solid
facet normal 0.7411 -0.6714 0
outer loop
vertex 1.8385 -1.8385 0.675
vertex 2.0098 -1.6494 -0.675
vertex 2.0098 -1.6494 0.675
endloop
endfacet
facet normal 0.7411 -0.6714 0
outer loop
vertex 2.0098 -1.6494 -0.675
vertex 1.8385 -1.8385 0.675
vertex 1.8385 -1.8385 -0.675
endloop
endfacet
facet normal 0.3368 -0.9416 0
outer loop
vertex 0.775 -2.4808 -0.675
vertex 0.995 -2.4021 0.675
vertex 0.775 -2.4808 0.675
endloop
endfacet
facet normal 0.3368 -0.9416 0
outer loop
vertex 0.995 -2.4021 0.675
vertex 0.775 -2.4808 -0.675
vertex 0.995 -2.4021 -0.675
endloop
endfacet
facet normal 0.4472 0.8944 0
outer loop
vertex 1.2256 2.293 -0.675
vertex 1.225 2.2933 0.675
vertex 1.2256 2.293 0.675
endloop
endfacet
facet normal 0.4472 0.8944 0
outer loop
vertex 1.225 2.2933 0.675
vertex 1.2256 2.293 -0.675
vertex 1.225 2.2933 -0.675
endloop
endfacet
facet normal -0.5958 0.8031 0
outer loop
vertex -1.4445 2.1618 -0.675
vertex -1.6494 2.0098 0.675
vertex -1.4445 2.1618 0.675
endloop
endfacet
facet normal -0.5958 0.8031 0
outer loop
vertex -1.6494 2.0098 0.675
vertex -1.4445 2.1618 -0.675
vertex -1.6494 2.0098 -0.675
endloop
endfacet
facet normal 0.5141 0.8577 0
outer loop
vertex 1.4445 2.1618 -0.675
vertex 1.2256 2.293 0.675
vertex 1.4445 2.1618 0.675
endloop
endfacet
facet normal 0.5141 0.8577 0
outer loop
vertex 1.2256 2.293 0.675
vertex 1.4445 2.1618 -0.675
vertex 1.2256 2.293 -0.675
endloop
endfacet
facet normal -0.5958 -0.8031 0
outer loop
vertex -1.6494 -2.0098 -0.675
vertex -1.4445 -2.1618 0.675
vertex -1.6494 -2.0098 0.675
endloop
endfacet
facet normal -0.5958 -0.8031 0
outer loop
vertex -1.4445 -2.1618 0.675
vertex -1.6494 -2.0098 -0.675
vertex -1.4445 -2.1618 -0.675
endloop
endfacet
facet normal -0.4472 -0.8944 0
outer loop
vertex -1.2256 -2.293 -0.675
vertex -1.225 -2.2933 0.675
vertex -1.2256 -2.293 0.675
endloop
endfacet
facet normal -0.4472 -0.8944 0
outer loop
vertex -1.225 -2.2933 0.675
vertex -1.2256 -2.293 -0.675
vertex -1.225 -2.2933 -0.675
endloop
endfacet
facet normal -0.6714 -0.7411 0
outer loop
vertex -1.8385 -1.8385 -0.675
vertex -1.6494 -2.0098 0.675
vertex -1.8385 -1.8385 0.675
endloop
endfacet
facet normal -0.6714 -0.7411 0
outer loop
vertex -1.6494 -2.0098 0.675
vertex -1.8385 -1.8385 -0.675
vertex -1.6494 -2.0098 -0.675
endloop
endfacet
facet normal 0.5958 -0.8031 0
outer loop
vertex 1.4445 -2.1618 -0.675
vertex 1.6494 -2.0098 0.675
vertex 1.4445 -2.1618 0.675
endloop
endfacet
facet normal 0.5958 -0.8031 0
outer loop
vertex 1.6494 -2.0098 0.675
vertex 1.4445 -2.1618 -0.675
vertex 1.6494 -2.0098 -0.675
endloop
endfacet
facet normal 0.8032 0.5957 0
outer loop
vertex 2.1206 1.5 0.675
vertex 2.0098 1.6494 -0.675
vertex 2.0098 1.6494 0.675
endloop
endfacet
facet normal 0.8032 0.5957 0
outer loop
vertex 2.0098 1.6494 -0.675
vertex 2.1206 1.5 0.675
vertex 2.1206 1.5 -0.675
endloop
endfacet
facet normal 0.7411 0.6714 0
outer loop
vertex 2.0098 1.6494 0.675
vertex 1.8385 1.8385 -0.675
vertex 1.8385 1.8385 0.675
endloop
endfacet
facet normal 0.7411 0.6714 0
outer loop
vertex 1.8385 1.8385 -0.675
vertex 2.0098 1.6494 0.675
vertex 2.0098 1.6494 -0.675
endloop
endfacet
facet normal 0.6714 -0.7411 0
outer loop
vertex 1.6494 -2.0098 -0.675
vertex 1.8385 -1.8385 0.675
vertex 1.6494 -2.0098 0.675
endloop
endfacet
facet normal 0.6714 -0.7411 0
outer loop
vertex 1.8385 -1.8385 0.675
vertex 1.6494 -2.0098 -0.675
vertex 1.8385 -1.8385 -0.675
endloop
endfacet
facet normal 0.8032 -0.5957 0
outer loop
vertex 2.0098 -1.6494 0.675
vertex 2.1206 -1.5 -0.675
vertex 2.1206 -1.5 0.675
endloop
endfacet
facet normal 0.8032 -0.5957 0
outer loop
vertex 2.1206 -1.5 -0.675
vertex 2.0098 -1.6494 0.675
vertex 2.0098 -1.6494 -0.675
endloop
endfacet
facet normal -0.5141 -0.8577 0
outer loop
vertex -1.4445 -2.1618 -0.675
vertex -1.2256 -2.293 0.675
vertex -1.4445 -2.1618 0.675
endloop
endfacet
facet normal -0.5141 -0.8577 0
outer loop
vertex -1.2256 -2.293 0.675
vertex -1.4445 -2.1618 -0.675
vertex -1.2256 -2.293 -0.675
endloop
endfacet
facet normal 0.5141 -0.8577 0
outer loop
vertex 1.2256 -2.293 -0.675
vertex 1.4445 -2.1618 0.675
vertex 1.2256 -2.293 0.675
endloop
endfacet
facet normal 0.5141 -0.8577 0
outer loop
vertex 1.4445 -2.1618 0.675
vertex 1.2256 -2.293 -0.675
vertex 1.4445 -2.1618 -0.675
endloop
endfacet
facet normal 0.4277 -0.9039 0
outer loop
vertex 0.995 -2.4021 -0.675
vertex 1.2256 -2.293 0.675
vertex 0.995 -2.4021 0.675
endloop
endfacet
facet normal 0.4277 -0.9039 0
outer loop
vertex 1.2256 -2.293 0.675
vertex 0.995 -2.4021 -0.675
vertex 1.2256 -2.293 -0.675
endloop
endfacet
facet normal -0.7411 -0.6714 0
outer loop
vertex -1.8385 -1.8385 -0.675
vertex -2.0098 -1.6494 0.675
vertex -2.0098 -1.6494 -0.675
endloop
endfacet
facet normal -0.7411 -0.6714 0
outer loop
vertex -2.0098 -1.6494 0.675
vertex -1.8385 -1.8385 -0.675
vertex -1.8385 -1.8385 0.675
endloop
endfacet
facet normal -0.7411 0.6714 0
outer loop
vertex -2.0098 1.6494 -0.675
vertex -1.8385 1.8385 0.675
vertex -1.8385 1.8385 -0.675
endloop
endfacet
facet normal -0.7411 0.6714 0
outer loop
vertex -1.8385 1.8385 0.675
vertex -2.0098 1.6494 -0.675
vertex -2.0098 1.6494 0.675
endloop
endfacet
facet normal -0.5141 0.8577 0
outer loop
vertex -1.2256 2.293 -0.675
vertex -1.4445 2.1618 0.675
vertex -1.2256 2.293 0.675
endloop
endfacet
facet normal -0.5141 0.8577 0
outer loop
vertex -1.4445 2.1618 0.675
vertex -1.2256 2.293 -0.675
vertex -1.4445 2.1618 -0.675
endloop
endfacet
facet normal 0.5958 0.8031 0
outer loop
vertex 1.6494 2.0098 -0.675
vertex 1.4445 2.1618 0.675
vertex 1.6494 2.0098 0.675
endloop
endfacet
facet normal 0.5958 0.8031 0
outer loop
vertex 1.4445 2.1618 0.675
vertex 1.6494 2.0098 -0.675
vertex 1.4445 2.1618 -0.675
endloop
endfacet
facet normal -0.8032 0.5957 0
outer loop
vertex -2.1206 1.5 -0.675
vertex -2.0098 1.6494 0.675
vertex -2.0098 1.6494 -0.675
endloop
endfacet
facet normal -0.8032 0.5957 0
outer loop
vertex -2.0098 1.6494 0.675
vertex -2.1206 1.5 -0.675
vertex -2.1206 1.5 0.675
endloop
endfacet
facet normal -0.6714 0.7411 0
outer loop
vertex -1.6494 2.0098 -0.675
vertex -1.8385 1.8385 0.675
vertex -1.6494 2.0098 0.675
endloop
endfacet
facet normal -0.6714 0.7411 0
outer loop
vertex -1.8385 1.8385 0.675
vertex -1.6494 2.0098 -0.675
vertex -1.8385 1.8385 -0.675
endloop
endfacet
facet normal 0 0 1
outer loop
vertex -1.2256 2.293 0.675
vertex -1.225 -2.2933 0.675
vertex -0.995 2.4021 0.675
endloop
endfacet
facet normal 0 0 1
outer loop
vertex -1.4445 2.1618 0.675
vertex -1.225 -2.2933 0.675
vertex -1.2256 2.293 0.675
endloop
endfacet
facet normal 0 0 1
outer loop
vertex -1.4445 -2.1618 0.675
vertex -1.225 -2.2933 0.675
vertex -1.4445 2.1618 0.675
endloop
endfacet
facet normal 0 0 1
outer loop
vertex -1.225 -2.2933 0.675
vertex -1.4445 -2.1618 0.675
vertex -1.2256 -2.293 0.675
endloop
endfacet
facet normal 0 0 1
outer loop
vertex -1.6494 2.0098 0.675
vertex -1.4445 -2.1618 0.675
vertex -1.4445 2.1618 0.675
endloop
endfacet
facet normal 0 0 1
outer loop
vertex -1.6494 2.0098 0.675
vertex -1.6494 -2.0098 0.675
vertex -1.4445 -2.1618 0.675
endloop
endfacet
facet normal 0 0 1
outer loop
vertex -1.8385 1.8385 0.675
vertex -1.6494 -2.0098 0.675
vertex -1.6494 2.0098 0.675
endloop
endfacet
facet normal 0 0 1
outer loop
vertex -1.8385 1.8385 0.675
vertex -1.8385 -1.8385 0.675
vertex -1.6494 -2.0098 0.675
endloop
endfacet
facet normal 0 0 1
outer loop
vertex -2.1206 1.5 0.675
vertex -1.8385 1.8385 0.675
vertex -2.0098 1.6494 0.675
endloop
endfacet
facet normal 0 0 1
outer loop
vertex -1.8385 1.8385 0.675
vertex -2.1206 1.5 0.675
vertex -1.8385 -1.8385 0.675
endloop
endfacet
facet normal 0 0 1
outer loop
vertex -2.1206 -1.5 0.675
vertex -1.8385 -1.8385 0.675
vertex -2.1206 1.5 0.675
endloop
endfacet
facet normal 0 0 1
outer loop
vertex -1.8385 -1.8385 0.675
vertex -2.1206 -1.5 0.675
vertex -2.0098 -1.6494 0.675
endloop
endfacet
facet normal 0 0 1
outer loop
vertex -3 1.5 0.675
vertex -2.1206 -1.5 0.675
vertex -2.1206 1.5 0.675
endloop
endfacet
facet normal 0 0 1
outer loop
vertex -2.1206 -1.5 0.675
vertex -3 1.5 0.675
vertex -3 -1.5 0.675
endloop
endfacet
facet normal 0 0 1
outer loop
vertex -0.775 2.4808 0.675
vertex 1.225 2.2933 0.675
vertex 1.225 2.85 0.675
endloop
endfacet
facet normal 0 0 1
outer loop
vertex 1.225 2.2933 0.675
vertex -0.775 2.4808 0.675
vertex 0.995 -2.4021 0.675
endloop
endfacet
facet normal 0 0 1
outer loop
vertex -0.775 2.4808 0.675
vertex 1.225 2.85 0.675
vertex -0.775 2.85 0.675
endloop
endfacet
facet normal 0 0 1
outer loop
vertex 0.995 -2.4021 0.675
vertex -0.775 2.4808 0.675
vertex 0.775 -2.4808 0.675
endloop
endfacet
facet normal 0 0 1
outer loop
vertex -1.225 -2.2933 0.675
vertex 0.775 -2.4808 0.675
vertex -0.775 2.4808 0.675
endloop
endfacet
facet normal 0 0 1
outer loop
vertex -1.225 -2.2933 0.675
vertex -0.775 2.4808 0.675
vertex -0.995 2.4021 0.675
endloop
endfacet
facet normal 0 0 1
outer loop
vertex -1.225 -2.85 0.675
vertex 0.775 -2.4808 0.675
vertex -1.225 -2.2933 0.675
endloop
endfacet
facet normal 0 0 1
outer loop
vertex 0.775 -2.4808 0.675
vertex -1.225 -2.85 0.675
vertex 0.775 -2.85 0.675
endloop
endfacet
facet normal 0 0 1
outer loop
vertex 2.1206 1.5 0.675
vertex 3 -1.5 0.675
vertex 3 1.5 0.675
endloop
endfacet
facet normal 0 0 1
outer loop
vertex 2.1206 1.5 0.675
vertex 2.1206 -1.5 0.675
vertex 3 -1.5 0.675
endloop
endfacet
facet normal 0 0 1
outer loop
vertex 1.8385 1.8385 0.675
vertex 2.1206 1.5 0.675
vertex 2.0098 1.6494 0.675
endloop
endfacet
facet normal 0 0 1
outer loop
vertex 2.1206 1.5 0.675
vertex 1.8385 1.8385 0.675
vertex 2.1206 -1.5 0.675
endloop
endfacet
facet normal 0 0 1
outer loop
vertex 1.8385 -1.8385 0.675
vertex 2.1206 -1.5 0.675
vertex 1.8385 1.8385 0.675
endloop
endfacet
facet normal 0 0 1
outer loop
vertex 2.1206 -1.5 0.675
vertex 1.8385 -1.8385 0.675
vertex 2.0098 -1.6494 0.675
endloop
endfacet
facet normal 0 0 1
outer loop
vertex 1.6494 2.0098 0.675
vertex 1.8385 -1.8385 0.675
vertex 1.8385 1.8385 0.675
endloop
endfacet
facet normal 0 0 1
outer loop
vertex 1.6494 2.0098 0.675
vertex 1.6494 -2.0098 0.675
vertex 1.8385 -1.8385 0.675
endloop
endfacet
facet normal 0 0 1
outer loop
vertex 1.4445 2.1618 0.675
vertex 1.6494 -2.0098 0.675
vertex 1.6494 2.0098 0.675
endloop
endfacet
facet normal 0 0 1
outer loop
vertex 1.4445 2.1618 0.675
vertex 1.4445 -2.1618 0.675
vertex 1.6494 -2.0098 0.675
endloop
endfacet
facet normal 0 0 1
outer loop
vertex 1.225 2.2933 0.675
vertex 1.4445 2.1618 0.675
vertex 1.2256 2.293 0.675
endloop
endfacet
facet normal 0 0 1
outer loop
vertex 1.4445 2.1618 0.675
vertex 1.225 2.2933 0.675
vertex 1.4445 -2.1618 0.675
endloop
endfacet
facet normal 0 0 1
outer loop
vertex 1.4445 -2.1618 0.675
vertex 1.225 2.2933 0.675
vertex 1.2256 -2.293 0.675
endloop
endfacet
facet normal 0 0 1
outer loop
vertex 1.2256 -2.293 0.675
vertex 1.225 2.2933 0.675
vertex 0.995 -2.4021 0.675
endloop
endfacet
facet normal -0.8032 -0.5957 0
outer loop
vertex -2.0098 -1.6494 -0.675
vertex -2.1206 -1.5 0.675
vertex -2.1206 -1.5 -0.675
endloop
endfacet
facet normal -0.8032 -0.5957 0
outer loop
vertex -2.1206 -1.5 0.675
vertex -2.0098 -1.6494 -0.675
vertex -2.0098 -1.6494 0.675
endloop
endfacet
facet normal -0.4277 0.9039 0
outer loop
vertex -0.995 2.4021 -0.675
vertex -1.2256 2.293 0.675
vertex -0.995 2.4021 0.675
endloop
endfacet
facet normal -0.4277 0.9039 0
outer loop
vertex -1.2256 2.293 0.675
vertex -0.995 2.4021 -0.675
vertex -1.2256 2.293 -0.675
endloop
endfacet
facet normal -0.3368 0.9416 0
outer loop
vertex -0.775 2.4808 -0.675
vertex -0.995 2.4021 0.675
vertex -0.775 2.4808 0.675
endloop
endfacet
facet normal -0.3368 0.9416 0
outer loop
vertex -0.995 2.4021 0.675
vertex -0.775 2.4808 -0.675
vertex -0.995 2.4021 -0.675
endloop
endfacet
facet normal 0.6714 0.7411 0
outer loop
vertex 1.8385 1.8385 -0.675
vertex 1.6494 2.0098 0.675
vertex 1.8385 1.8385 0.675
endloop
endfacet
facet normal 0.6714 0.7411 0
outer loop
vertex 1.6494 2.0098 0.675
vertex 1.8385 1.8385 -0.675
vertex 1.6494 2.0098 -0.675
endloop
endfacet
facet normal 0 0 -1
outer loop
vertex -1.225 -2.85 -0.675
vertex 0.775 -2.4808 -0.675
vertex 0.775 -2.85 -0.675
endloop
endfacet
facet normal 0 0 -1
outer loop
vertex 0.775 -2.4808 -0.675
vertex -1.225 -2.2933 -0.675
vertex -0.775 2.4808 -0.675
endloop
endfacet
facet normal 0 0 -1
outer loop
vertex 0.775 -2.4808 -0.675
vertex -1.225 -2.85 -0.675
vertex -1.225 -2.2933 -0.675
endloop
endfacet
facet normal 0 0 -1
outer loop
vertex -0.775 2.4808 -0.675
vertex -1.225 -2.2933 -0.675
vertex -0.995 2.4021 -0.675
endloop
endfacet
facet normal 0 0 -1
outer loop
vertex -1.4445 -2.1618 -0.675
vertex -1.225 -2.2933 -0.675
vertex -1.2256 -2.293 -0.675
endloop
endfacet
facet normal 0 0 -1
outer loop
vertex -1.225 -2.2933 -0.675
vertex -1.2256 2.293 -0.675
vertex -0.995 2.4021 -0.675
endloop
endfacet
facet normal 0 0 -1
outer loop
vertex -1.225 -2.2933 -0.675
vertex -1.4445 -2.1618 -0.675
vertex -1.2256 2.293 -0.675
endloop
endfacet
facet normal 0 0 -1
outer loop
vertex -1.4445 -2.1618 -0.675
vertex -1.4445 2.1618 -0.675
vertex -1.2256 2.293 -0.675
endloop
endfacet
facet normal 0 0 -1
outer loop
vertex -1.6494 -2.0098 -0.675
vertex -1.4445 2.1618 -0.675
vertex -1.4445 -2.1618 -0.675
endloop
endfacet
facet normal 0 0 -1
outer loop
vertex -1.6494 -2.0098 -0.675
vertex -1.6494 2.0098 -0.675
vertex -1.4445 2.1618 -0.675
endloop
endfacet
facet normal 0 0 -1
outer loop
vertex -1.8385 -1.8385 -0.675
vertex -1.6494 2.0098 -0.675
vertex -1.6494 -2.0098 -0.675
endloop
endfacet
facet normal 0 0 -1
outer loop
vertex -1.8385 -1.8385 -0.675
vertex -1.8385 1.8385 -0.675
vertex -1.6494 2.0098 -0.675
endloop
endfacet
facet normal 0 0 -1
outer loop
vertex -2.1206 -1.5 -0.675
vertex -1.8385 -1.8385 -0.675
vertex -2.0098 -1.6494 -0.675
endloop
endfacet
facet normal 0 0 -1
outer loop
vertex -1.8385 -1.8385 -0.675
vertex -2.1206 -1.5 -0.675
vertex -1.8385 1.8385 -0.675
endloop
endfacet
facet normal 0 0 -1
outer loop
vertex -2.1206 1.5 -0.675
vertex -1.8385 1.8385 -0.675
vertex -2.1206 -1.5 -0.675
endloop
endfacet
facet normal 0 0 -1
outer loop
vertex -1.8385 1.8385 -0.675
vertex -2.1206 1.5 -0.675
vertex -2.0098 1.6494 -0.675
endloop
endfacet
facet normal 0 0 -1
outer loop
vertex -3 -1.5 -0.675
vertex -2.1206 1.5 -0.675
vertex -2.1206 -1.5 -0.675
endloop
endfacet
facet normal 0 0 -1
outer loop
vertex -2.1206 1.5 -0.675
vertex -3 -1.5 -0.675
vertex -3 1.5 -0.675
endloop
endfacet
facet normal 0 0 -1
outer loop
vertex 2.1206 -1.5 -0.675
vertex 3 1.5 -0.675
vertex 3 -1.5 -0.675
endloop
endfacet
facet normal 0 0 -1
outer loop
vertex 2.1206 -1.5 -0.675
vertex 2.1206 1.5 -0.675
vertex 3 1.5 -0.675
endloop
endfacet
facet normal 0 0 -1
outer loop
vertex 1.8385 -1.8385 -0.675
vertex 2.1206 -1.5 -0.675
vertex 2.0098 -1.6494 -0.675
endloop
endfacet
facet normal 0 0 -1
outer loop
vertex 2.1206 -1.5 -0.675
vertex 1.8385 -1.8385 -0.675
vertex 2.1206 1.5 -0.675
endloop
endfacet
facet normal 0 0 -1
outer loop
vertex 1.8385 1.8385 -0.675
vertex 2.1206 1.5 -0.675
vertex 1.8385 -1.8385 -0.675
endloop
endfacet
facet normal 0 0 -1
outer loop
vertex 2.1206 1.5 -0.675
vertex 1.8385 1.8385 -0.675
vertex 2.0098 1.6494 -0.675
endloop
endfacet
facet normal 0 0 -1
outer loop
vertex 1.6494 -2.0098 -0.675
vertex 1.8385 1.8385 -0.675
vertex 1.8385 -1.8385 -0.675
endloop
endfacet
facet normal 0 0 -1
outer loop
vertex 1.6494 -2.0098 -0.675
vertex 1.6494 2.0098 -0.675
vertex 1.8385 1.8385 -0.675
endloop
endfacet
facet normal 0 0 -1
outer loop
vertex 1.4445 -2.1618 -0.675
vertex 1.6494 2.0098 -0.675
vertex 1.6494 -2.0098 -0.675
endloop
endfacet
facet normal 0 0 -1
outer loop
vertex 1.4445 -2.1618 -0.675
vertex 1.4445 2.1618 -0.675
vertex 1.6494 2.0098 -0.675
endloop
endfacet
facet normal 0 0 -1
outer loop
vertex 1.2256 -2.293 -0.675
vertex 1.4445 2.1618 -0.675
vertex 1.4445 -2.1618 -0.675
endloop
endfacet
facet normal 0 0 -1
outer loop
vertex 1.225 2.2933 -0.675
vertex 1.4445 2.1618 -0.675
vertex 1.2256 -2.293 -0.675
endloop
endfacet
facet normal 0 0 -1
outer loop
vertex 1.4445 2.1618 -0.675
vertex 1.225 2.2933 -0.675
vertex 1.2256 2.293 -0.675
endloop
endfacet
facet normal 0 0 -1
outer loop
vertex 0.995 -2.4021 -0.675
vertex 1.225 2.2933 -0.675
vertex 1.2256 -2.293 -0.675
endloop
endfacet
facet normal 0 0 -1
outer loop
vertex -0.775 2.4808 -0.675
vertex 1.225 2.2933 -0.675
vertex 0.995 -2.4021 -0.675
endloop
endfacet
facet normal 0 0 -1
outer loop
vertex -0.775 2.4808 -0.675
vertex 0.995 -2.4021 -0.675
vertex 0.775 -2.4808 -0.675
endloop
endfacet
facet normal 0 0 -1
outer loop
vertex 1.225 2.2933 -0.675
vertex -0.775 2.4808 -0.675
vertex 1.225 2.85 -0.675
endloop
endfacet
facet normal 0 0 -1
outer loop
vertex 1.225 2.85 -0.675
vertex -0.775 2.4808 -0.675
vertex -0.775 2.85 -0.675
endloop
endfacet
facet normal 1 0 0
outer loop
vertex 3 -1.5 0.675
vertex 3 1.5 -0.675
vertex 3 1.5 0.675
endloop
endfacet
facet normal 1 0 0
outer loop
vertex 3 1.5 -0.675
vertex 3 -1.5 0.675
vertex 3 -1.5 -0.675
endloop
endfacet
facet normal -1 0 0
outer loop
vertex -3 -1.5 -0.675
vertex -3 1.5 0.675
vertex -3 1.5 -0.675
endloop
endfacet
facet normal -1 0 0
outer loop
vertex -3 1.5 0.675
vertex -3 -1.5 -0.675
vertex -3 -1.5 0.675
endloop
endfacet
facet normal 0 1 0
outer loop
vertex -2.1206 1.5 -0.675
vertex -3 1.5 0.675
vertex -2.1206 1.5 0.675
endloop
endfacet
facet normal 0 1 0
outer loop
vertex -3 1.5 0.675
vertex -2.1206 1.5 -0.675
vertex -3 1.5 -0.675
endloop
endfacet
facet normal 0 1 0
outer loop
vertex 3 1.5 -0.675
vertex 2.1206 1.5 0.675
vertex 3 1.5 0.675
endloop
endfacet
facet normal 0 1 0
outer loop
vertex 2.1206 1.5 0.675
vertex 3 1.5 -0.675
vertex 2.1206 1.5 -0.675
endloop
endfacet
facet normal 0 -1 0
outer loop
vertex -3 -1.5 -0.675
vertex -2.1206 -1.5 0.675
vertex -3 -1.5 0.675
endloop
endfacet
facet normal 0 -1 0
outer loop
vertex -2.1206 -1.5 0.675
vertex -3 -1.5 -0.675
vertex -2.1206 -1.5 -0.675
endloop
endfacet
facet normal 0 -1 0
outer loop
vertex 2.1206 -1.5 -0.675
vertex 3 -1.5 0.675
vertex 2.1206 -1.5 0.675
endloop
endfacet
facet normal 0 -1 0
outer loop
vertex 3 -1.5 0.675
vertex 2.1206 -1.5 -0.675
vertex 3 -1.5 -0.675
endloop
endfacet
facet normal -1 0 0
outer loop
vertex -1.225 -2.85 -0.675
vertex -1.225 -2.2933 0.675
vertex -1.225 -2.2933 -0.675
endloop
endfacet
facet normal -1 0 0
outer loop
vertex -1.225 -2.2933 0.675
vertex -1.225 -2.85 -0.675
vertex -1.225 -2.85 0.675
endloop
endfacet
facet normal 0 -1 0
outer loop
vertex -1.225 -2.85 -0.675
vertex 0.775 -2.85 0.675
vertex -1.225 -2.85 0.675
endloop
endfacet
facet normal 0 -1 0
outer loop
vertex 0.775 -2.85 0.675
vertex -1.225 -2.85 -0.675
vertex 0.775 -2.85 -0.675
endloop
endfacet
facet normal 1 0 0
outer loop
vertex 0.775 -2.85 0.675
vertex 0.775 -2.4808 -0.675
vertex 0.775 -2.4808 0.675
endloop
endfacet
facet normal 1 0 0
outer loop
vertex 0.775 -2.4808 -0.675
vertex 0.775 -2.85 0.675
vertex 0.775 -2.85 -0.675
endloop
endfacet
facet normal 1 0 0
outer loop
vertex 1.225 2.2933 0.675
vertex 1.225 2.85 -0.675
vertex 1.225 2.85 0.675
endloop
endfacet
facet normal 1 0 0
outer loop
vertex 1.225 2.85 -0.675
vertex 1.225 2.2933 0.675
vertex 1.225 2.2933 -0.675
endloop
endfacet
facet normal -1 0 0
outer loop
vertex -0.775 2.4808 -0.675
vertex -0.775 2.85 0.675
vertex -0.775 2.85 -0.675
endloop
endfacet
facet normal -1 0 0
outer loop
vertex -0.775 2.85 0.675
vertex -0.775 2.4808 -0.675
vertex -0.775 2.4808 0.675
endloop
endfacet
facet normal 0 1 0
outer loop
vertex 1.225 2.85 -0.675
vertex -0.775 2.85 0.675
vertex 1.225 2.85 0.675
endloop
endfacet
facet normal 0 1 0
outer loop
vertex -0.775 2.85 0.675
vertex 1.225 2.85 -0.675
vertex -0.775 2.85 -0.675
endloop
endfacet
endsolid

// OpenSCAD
// Start: lazy_union
default_5_default_5();
// End: lazy_union

// Modules.

// 'PartMaterial undef-default - default 5.0'
module default_5_default_5() {
  // 'None : _combine_solids_and_holes'
  union() {
    // 'default : _combine_solids_and_holes'
    union() {
      // 'master'
      multmatrix(m=[[1.0, 0.0, 0.0, 0.0], [-0.0, -1.0, -0.0, -0.0], [-0.0, -0.0, -1.0, 0.6749999999999998], [0.0, 0.0, 0.0, 1.0]]) {
        // 'master : _combine_solids_and_holes'
        union() {
          // 'master'
          cylinder(h=1.3499999999999996, r1=2.6, r2=2.6, center=false, $fn=64);
        }
      }
      // 'block1'
      multmatrix(m=[[1.0, 0.0, 0.0, -3.0], [0.0, 1.0, 0.0, -1.5], [0.0, 0.0, 1.0, -0.6749999999999998], [0.0, 0.0, 0.0, 1.0]]) {
        // 'block1 : _combine_solids_and_holes'
        union() {
          // 'block1'
          cube(size=[6.0, 3.0, 1.3499999999999996]);
        }
      }
      // ('block2', 0)
      multmatrix(m=[[1.0, 0.0, 0.0, -1.225], [-0.0, -1.0, -0.0, -0.0], [-0.0, -0.0, -1.0, 0.6749999999999998], [0.0, 0.0, 0.0, 1.0]]) {
        // "('block2', 0) : _combine_solids_and_holes"
        union() {
          // ('block2', 0)
          cube(size=[2.0, 2.85, 1.3499999999999996]);
        }
      }
      // ('block2', 1)
      multmatrix(m=[[1.0, 0.0, 0.0, -0.7749999999999999], [0.0, 1.0, 0.0, 0.0], [0.0, 0.0, 1.0, -0.6749999999999998], [0.0, 0.0, 0.0, 1.0]]) {
        // "('block2', 1) : _combine_solids_and_holes"
        union() {
          // ('block2', 1)
          cube(size=[2.0, 2.85, 1.3499999999999996]);
        }
      }
    }
  }
} // end module default_5_default_5
